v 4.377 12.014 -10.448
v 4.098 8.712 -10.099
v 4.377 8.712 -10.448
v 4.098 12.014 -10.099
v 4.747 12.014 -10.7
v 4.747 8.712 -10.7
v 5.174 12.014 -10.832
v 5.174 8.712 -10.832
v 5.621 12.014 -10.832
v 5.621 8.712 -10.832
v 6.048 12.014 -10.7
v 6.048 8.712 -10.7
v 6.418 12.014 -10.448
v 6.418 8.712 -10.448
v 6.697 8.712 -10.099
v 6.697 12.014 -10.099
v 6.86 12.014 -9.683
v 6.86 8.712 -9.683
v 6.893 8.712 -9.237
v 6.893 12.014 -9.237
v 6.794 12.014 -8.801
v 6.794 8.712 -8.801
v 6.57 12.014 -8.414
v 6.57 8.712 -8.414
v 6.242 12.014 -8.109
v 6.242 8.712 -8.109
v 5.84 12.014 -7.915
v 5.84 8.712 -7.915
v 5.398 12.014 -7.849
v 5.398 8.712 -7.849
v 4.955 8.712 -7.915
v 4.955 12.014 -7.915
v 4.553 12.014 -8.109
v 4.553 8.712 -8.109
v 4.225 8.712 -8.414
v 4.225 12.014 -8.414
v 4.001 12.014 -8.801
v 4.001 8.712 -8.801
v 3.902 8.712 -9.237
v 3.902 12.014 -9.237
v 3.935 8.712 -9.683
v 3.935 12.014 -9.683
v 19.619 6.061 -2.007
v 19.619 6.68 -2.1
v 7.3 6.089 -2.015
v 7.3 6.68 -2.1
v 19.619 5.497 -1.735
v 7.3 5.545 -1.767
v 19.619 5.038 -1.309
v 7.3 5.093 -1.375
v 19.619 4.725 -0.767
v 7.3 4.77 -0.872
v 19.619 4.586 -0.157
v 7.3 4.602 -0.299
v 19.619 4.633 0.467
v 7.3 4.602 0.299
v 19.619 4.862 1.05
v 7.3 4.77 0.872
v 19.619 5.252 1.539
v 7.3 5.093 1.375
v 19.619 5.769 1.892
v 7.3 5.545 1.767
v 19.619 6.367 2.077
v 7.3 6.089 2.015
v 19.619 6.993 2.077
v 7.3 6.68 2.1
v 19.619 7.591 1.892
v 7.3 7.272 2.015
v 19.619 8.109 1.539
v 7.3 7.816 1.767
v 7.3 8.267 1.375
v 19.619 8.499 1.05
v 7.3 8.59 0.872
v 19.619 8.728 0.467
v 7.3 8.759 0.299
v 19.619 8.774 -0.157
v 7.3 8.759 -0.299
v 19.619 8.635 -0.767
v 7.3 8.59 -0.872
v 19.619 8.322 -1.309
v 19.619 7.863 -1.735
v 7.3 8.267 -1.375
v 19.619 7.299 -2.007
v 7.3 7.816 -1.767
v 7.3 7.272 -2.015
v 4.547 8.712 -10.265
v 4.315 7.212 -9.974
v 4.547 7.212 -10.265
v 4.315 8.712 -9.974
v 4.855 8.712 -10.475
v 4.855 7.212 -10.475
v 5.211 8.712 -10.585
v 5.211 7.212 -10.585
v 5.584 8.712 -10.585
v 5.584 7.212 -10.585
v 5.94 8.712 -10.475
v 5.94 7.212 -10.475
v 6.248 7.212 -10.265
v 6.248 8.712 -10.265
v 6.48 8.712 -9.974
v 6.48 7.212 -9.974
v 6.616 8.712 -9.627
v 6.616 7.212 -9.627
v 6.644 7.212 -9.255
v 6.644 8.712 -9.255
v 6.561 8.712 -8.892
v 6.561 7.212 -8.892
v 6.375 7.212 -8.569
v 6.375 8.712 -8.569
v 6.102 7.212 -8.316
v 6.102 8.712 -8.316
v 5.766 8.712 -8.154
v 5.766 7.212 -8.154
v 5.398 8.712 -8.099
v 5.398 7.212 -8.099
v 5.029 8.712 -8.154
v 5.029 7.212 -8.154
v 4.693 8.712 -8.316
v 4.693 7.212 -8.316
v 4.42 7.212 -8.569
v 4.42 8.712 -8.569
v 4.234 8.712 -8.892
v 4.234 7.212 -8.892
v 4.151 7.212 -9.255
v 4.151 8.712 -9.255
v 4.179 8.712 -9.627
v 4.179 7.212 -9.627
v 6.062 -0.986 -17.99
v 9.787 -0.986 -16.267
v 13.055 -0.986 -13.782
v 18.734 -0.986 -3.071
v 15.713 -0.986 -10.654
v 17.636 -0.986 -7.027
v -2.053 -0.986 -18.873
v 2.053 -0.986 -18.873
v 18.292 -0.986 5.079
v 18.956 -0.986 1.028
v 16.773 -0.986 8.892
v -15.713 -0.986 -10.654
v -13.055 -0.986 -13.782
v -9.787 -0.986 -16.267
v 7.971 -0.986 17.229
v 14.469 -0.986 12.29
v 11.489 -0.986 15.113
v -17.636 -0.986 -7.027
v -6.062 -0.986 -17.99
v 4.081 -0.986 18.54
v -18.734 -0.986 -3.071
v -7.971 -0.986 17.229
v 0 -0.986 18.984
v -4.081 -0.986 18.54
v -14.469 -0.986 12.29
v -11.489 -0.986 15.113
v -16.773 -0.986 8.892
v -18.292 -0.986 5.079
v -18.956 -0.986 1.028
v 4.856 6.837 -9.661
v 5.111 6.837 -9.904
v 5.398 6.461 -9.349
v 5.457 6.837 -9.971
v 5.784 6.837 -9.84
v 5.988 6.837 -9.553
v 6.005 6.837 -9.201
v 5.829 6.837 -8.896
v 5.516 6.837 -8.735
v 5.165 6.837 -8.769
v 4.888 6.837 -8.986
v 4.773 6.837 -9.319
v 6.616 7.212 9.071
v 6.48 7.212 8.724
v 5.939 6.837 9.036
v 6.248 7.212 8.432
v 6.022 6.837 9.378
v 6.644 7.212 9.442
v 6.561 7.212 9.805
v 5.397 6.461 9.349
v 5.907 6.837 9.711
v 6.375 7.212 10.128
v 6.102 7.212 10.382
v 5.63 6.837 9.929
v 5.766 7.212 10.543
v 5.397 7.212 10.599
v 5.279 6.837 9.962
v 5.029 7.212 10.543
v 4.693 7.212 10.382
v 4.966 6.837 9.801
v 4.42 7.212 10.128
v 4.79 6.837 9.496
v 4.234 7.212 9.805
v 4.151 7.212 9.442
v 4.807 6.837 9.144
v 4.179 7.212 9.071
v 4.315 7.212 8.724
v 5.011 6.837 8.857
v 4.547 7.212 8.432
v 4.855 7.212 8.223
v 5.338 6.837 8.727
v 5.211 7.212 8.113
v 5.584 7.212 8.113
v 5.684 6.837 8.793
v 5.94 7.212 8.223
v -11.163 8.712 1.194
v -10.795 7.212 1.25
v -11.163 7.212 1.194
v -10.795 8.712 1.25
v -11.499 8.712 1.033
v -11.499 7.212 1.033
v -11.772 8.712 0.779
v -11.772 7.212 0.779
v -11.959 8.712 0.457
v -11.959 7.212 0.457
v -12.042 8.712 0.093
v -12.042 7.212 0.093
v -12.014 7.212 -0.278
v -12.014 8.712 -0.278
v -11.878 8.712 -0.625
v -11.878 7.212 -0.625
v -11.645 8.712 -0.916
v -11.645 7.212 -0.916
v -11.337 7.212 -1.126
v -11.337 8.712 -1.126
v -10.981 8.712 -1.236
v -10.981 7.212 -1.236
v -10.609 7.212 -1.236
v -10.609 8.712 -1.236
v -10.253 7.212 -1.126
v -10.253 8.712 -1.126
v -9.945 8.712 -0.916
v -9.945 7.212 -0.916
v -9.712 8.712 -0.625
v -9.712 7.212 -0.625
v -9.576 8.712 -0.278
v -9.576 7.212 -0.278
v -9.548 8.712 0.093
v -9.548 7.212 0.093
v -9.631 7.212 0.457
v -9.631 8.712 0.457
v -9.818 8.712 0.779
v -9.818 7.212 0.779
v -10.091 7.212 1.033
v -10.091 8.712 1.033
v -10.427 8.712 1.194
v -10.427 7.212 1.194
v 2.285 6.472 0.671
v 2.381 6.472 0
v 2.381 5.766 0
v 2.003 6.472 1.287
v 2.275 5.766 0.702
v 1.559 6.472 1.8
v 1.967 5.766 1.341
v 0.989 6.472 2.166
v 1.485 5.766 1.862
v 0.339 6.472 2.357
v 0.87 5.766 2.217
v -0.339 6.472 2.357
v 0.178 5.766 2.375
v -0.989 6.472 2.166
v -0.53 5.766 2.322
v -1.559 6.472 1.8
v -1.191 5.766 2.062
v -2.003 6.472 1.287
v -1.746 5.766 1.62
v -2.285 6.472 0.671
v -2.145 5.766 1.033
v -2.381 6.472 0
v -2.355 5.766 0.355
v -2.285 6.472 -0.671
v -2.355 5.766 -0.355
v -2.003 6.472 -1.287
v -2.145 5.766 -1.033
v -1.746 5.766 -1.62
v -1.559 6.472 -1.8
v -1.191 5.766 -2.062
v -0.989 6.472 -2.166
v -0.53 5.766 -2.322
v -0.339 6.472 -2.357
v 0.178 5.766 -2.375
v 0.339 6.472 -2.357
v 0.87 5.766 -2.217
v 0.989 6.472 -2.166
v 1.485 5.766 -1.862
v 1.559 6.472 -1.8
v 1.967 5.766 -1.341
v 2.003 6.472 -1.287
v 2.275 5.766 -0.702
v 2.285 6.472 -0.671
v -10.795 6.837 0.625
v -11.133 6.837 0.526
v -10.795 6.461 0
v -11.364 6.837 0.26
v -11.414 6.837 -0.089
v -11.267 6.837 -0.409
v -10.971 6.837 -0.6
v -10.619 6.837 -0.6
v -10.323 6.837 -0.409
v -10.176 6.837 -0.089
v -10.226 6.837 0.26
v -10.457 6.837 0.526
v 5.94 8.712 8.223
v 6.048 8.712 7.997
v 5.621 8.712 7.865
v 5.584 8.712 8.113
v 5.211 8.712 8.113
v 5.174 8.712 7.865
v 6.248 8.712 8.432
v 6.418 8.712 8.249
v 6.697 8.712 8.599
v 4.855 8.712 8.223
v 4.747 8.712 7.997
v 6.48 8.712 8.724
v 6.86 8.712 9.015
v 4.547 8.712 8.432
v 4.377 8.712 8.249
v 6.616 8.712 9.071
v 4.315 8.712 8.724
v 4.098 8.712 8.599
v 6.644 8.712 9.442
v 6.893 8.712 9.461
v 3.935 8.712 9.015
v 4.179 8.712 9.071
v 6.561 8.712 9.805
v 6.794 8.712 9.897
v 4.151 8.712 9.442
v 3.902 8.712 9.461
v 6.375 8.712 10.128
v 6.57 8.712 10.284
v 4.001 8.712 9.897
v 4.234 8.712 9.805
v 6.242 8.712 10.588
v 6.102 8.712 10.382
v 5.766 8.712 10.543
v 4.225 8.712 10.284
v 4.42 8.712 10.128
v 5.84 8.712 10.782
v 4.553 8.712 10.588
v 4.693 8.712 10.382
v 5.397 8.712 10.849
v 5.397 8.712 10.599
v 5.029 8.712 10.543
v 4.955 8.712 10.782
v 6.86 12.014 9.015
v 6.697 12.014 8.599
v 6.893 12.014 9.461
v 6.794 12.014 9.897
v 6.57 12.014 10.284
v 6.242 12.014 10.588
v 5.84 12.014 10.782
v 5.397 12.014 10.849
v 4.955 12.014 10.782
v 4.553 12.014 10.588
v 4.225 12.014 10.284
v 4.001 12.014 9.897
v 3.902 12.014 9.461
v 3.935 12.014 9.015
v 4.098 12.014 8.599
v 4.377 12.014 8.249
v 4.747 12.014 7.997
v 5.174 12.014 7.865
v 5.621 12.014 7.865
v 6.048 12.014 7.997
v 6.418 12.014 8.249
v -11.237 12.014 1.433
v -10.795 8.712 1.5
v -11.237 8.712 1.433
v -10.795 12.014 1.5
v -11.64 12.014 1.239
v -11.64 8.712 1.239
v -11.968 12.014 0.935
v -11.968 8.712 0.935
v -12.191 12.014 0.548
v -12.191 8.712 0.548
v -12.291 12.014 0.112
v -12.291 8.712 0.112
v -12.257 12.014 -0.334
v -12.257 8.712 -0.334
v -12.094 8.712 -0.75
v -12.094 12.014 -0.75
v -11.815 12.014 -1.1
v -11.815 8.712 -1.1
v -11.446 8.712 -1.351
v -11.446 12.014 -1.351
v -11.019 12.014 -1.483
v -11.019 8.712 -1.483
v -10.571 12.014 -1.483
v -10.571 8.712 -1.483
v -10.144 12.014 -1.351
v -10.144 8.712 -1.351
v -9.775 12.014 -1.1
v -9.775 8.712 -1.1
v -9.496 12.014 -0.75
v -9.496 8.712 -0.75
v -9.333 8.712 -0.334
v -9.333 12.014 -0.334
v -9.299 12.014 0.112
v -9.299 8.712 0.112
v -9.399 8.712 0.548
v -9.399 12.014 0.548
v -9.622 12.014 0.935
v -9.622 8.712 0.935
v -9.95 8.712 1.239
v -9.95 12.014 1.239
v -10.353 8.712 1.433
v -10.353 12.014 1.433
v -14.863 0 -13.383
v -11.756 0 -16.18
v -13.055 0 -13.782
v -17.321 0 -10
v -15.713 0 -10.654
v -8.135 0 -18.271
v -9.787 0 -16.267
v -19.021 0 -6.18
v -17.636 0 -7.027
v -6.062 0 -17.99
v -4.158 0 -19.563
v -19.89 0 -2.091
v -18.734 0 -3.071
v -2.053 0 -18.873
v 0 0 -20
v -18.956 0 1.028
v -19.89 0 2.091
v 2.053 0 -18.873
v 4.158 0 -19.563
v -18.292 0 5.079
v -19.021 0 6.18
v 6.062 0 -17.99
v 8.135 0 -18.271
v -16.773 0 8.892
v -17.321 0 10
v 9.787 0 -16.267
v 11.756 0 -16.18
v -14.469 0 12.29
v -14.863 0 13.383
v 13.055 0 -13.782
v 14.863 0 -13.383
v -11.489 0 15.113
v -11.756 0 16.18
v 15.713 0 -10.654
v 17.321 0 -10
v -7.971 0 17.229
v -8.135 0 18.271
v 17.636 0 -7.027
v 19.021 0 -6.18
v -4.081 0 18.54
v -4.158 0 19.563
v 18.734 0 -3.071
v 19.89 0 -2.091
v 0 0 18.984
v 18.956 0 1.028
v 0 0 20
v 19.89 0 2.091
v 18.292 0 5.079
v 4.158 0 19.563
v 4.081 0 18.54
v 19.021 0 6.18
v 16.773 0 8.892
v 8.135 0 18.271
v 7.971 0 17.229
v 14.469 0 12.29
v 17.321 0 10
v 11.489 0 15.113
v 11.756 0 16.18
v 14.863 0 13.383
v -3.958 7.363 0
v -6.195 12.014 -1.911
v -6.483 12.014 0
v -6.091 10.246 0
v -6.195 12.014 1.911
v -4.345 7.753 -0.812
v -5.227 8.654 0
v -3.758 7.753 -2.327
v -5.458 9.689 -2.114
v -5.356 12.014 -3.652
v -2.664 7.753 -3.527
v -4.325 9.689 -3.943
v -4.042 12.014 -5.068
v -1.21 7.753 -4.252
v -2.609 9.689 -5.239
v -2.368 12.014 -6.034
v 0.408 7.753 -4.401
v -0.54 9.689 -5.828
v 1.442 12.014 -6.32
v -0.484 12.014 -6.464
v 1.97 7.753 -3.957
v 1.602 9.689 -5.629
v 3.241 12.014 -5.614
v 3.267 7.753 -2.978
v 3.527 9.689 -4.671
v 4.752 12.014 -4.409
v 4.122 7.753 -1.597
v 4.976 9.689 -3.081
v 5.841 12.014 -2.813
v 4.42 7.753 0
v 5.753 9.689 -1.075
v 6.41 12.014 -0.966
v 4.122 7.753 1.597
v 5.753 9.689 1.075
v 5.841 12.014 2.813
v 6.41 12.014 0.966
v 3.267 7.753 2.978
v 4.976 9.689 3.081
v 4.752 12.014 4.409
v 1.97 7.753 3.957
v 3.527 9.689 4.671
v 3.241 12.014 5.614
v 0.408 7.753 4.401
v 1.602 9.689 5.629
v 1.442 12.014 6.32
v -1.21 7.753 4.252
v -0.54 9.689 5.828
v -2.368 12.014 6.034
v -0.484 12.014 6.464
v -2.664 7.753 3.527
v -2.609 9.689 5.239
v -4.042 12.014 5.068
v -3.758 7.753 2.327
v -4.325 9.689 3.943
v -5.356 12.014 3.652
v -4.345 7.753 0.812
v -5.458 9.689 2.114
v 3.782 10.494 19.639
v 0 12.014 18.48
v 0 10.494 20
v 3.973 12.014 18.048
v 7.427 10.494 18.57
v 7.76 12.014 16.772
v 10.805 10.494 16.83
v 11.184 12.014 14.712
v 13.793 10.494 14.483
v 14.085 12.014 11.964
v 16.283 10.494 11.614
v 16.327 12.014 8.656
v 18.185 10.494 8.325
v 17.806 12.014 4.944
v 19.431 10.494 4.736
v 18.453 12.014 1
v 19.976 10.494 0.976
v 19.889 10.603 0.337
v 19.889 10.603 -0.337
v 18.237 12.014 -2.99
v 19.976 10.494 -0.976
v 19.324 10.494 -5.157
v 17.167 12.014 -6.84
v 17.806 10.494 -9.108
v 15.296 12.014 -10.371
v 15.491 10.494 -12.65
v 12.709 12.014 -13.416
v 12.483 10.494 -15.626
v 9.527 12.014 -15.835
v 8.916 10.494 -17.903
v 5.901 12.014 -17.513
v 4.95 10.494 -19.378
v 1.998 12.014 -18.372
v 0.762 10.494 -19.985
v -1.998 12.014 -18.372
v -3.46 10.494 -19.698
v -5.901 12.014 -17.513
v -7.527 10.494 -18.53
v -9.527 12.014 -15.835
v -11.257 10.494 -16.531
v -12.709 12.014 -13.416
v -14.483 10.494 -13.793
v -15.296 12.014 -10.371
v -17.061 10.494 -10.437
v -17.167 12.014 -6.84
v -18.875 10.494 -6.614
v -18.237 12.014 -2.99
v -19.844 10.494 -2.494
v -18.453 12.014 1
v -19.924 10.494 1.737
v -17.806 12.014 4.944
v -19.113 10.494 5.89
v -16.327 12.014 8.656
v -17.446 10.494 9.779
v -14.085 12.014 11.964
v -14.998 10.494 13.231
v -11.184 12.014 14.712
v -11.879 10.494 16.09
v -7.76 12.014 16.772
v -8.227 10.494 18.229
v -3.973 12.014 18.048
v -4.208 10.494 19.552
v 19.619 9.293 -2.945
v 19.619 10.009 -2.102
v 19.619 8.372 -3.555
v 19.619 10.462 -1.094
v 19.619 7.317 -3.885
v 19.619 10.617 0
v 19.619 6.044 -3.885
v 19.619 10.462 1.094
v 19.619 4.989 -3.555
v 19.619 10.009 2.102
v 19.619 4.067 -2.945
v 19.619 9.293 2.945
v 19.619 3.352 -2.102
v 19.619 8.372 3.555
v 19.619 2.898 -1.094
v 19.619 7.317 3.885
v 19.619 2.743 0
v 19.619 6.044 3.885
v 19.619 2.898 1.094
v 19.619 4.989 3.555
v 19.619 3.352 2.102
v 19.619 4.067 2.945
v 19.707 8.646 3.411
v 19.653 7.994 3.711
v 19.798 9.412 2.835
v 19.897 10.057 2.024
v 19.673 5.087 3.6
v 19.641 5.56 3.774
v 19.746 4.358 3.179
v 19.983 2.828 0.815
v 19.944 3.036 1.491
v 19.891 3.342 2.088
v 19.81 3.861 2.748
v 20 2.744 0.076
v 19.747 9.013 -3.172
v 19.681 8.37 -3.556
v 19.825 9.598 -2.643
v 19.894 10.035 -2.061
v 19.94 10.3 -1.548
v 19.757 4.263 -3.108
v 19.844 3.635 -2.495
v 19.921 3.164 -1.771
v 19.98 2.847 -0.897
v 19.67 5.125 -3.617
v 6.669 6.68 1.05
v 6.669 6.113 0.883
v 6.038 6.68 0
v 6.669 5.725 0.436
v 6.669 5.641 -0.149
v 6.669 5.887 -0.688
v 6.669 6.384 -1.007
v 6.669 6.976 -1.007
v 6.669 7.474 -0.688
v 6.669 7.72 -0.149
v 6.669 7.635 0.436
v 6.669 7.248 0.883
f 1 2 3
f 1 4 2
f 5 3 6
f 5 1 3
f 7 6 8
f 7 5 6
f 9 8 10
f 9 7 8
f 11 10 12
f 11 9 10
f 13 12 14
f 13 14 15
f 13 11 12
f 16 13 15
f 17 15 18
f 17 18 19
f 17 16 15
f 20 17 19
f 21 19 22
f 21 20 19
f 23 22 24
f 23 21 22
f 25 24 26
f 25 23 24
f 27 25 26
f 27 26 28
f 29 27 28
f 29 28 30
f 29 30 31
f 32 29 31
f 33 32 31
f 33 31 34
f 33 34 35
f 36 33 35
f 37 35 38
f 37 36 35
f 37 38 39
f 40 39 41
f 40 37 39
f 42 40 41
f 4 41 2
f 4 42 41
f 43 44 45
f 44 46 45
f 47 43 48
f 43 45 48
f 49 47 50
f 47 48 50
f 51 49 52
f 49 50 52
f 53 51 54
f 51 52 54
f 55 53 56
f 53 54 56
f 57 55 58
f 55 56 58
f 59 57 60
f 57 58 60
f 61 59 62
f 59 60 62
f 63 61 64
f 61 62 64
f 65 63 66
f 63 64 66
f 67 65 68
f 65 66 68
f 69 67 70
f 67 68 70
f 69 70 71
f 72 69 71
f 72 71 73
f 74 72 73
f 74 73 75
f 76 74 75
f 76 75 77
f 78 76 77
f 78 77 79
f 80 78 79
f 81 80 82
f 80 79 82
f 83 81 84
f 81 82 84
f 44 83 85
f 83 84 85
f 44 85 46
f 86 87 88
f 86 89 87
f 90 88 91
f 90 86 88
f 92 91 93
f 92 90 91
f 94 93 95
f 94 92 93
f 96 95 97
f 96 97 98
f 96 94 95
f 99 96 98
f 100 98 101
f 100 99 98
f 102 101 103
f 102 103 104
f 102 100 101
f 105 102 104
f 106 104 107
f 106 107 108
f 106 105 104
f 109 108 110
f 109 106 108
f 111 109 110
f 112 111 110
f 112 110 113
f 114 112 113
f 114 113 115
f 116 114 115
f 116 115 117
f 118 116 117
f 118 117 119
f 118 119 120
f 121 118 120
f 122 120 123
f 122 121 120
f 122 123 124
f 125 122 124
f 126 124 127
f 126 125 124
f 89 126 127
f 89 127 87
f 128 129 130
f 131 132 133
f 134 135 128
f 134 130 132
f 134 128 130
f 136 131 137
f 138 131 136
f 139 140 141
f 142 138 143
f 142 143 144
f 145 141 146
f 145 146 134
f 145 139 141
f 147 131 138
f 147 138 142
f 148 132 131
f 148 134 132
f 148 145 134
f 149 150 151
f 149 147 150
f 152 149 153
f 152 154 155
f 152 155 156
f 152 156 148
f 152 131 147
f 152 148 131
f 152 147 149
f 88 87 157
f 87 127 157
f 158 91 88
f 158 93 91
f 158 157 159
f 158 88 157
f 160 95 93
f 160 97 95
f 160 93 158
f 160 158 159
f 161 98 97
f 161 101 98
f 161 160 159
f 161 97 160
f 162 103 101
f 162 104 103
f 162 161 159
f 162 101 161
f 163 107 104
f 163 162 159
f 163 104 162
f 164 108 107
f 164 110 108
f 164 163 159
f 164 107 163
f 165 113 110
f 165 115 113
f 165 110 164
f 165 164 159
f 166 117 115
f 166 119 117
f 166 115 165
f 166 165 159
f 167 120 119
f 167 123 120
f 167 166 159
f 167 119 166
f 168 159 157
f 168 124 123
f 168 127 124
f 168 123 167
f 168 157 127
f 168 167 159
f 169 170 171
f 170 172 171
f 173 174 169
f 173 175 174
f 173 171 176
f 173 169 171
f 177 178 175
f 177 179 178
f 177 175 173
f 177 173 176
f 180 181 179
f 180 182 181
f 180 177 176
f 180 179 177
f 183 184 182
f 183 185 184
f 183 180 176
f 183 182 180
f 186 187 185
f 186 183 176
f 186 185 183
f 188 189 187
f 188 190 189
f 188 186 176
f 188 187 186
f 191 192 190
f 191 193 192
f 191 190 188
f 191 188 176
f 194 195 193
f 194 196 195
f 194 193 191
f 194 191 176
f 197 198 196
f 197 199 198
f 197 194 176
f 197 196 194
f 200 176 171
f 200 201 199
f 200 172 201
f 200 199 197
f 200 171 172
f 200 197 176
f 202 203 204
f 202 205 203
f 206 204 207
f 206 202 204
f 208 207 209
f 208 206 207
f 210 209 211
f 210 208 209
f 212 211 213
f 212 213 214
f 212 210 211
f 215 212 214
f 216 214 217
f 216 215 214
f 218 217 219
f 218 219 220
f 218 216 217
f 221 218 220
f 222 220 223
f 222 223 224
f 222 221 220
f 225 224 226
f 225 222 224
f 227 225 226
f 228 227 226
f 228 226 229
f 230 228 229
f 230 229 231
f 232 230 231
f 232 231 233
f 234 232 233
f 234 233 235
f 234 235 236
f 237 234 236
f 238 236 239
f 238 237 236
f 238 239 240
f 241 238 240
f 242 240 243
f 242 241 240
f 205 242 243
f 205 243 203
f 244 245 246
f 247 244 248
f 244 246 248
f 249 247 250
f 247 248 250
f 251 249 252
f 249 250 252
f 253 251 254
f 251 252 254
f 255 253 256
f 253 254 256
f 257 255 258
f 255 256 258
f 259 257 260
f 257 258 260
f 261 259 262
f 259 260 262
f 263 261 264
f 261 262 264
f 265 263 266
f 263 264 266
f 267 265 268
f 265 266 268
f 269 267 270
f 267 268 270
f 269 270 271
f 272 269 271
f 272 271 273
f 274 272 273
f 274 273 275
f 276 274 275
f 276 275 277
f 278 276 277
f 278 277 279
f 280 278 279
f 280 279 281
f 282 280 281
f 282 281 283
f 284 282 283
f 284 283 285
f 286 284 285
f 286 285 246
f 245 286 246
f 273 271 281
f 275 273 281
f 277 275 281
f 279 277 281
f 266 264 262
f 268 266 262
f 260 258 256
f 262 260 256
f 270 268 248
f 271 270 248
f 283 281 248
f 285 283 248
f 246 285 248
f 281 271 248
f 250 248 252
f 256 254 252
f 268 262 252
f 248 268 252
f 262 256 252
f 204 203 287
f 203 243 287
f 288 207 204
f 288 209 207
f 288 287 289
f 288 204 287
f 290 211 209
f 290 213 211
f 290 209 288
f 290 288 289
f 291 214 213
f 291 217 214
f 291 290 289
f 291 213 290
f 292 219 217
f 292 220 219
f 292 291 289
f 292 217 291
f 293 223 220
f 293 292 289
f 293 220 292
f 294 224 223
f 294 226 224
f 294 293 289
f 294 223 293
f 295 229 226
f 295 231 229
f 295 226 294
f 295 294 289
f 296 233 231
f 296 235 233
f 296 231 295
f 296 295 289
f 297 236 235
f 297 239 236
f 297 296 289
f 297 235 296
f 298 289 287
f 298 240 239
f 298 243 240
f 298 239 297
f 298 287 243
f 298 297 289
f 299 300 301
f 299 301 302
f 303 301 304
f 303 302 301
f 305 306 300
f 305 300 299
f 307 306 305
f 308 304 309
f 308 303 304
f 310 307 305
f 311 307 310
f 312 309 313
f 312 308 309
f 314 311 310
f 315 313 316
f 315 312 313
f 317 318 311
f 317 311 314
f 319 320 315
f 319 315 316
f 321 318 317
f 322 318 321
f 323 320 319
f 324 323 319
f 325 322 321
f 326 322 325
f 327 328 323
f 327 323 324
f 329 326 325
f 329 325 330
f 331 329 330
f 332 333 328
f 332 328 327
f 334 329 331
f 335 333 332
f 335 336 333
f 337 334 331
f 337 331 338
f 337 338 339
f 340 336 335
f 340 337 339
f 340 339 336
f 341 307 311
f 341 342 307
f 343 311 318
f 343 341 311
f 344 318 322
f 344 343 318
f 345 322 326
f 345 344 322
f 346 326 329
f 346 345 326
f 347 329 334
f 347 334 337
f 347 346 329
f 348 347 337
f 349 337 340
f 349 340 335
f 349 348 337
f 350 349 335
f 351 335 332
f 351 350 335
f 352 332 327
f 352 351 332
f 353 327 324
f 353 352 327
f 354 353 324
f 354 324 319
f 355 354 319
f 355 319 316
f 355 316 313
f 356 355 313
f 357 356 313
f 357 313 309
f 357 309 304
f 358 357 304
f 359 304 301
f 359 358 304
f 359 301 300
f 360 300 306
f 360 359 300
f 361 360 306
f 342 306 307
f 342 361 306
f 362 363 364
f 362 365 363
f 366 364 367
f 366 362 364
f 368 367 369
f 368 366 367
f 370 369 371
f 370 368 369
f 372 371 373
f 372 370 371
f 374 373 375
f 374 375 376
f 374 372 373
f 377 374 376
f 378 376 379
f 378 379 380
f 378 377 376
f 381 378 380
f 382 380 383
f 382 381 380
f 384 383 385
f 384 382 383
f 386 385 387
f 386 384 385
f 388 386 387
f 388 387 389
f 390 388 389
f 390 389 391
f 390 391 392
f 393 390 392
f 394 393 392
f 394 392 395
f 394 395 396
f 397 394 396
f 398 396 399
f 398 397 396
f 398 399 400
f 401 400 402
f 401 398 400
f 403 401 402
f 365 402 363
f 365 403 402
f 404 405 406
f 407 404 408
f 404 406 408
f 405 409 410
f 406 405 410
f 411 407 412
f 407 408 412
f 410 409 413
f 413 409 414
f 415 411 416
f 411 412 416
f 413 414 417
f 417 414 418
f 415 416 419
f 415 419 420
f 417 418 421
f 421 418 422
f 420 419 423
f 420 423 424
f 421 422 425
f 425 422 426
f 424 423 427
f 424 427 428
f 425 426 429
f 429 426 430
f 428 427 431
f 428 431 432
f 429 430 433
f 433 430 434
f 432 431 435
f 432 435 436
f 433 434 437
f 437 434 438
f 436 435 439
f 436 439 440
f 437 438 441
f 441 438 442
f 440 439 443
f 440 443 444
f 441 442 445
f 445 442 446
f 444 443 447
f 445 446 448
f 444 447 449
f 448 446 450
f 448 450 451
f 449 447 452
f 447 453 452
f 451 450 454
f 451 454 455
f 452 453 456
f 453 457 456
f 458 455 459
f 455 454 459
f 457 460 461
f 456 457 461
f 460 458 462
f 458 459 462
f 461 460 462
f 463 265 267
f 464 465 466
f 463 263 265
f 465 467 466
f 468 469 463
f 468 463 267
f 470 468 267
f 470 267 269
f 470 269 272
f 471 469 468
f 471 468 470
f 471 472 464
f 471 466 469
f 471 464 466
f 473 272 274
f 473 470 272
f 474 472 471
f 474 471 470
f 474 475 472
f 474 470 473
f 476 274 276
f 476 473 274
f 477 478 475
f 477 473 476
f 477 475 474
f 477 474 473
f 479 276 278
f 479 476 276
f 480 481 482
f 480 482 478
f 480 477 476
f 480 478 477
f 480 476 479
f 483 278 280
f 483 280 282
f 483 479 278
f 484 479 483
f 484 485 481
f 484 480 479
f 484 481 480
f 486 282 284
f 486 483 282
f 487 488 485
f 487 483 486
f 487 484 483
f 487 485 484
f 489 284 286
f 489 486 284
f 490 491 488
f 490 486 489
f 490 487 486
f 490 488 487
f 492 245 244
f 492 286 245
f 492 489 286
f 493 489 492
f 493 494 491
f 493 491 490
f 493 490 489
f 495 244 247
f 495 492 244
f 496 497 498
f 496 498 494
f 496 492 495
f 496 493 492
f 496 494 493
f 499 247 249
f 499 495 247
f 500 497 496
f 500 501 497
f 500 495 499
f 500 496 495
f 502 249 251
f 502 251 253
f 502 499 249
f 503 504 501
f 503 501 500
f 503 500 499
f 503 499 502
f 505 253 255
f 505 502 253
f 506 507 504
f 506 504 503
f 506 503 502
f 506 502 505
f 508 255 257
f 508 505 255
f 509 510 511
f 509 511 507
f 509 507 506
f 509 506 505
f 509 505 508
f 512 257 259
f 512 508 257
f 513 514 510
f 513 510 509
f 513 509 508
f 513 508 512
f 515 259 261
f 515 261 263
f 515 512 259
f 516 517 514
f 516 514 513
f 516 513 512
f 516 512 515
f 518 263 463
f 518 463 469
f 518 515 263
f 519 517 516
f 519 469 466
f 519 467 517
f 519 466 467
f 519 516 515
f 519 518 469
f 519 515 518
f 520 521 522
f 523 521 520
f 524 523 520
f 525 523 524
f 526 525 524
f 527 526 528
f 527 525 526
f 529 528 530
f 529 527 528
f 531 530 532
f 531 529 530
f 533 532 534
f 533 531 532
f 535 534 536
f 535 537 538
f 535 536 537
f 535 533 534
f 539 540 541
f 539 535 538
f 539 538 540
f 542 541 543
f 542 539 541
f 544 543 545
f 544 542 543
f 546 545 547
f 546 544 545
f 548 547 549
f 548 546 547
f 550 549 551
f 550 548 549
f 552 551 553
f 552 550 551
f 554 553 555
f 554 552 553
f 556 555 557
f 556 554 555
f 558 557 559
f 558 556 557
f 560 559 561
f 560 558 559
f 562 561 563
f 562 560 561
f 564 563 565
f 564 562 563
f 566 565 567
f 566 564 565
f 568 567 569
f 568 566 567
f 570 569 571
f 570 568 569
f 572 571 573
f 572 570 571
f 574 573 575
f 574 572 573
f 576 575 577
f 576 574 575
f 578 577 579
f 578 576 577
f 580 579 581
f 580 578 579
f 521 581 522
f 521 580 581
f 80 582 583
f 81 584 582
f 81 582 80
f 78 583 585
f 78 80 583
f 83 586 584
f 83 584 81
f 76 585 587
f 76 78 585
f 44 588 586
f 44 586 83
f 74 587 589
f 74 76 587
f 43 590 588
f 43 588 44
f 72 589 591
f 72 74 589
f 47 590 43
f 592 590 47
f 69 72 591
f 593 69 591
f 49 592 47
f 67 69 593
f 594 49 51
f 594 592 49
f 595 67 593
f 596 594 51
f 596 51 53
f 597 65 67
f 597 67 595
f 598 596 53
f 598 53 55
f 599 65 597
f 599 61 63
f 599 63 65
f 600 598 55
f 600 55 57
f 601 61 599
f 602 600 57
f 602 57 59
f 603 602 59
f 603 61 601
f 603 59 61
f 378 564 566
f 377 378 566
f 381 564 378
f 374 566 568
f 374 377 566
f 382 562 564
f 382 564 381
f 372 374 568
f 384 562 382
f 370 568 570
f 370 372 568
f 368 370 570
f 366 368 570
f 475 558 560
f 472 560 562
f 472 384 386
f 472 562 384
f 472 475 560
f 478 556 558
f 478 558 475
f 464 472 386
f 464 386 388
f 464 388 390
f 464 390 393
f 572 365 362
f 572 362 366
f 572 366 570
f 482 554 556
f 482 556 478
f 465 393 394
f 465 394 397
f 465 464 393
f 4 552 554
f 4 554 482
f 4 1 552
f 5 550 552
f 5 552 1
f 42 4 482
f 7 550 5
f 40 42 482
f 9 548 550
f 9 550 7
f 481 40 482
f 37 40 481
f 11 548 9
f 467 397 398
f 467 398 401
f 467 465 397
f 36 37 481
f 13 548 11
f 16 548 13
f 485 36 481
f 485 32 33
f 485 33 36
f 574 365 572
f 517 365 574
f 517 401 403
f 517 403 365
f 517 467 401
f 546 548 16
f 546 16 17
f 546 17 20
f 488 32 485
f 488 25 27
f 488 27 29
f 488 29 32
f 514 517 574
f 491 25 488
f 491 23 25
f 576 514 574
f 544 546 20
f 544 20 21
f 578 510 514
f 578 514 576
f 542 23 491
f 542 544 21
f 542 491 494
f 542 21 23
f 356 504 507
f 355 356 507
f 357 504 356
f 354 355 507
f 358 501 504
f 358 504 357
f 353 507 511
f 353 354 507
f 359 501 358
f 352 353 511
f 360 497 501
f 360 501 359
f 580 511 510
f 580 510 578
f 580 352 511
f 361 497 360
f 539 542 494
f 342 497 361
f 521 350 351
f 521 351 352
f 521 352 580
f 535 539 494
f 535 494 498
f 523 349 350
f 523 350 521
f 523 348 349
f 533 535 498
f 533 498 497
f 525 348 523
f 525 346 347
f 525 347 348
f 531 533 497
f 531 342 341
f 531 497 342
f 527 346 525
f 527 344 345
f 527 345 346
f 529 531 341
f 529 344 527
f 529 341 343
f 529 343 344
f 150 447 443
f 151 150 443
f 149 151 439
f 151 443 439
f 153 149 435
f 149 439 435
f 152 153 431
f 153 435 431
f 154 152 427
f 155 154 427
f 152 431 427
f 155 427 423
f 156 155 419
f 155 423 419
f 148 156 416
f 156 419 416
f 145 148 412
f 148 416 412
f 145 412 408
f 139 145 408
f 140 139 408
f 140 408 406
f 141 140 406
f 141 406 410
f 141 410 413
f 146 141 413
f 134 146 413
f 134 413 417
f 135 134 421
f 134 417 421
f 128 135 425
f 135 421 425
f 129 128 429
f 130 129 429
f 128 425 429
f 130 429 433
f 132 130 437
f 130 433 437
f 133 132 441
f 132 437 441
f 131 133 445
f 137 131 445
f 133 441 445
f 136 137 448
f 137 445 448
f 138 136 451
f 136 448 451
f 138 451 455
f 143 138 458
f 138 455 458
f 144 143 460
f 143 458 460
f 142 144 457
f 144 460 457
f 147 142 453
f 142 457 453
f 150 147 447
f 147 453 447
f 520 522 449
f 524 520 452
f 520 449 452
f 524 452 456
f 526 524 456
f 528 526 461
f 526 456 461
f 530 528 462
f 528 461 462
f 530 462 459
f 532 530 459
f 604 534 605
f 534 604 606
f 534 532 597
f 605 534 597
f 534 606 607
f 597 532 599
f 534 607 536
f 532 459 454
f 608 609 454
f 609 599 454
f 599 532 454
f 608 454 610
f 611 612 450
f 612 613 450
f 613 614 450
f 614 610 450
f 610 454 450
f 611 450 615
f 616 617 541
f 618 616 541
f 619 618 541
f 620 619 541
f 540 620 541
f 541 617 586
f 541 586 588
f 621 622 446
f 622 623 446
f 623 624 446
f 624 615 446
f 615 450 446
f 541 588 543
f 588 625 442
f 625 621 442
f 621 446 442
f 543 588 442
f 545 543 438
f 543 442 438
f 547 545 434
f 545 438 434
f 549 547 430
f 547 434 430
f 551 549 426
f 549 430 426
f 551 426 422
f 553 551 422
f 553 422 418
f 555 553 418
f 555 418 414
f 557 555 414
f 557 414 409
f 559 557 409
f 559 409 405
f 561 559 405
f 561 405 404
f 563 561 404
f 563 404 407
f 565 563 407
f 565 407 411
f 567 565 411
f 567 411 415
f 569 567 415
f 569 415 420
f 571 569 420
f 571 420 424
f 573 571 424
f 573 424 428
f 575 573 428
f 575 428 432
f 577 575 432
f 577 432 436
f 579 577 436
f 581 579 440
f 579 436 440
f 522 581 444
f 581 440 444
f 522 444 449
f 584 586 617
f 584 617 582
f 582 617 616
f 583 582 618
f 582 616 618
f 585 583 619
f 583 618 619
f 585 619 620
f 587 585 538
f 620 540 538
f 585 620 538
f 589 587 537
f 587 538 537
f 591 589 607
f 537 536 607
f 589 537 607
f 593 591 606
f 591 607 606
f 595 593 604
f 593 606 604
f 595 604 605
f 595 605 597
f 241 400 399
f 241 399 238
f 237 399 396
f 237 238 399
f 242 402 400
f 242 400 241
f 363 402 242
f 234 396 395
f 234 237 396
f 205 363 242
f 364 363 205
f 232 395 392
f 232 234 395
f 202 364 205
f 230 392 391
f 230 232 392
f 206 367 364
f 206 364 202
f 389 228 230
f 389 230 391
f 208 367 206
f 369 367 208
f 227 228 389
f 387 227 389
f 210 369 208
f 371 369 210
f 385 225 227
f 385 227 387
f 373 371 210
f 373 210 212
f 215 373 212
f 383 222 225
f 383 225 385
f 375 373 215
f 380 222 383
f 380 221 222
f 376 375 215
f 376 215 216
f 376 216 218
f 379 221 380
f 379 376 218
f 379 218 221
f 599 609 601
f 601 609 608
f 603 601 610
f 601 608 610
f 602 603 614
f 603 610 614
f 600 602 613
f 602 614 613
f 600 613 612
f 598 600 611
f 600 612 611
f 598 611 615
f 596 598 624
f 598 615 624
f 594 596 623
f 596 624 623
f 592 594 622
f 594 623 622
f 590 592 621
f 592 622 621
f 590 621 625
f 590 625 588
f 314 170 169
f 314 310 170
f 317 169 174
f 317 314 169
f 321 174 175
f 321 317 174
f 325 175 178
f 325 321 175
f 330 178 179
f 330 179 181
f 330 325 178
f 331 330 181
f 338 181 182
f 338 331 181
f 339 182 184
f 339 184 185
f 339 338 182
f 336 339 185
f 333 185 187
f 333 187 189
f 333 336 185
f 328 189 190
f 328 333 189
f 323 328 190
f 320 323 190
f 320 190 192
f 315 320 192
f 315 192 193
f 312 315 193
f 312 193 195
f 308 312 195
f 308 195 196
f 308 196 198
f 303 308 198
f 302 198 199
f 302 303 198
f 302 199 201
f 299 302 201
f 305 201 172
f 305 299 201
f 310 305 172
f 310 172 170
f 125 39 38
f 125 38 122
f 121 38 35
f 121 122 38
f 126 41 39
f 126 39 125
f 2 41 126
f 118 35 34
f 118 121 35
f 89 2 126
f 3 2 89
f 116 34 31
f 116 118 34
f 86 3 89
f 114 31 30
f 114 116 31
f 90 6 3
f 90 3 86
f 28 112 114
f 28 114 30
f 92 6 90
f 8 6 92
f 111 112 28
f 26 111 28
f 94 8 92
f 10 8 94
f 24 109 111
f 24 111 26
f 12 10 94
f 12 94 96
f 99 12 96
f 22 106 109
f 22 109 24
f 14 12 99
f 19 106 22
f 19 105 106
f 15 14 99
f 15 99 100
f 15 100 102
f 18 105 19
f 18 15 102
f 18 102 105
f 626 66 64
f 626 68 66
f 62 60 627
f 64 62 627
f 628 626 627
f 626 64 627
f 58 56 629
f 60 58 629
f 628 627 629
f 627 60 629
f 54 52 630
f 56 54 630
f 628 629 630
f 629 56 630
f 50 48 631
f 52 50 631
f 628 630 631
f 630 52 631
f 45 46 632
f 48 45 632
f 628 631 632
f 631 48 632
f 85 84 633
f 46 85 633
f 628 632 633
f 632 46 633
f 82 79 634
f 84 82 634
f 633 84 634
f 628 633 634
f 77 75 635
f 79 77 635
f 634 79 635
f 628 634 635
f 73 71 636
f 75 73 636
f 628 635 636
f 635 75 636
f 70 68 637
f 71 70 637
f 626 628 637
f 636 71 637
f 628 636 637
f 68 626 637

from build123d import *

# Parameters (mm, degrees)
SKETCH1_R                          = 20
EXTRUDE1_DEPTH                     = 12.0142
CHAMFER1_SIZE                      = 1.52
F_3_16_0_1875_DIAMETER_HOLE1_D     = 4.7625
F_3_16_0_1875_DIAMETER_HOLE1_DEPTH = 6.2484
SKETCH5_R                          = 18.984
EXTRUDE2_DEPTH                     = 0.98552
M5X0_8_TAPPED_HOLE1_D              = 4.2
M5X0_8_TAPPED_HOLE1_DEPTH          = 12.7
M5X0_8_TAPPED_HOLE1_TIP            = 1.2618073
CIRPATTERN1_COUNT                  = 3
SKETCH10_R                         = 3.937
CUT_EXTRUDE3_DEPTH                 = 0.381


with BuildPart() as part:
    # Sketch1 → Extrude1 (new body)
    with BuildSketch(Plane(origin=(0, 0, 0), x_dir=(1, 0, 0), z_dir=(0, 1, 0))):
        with Locations(Location((0, 0, 0), (0, 0, 270))):  # turned: the seam where the file's is
            Circle(SKETCH1_R)
    extrude(amount=EXTRUDE1_DEPTH)

    # Chamfer1
    chamfer1_edges = [part.edges().sort_by_distance(p)[0] for p in [
        (0, 12.0142, -20),
    ]]
    chamfer(chamfer1_edges, length=CHAMFER1_SIZE)

    # Sketch2 → Cut-Revolve1 (revolve, cut)
    with BuildSketch(Plane.XY):
        with BuildLine():
            Line((0, 19.0246), (0, 6.0198))
            ThreePointArc((0, 6.0198), (-6.5024, 12.5222), (0, 19.0246))
        make_face()
    revolve(axis=Axis((0, 19.0246, 0), (0, -1, 0)), mode=Mode.SUBTRACT)

    # 3_16 _0.1875_ Diameter Hole1
    with Locations(Plane(origin=(0, 12.0142, 0), x_dir=(-1, 0, 0), z_dir=(0, 1, 0))):
        with Locations((0, 0)):
            Hole(F_3_16_0_1875_DIAMETER_HOLE1_D / 2, depth=F_3_16_0_1875_DIAMETER_HOLE1_DEPTH)

    # Sketch5 → Extrude2 (add)
    with BuildSketch(Plane.XZ):
        with Locations(Location((0, 0, 0), (0, 0, 90))):  # turned: the seam where the file's is
            Circle(SKETCH5_R)
    extrude(amount=EXTRUDE2_DEPTH)

    # M5x0.8 Tapped Hole1
    with Locations(Plane(origin=(20, 6.6802, 0), x_dir=(0, 0, 1), z_dir=(1, 0, 0))):
        with Locations((0, 0)):
            Hole(M5X0_8_TAPPED_HOLE1_D / 2, depth=M5X0_8_TAPPED_HOLE1_DEPTH)
            with Locations((0, 0, -(M5X0_8_TAPPED_HOLE1_DEPTH + M5X0_8_TAPPED_HOLE1_TIP / 2))):  # 118° drill point
                Cone(0, M5X0_8_TAPPED_HOLE1_D / 2, M5X0_8_TAPPED_HOLE1_TIP, mode=Mode.SUBTRACT)

    # Sketch8 → M3x0.5 Tapped Hole1 (revolve, cut)
    with BuildSketch(Plane(origin=(-10.795, 12.0142, 0), x_dir=(0, 0, 1), z_dir=(1, 0, 0))):
        Polygon((0, 0), (0, 5.553072774), (1.25, 4.801997), (1.25, 3.302), (1.5, 3.302), (1.5, 0), align=None)
    m3x0_5_tapped_hole1 = revolve(axis=Axis((-10.795, 18.3642, 0), (0, -1, 0)), mode=Mode.SUBTRACT)

    # CirPattern1: M3x0.5 Tapped Hole1 ×3 about axis
    cirpattern1_axis = Axis((0, 0, 0), (0, 1, 0))
    for i in range(1, CIRPATTERN1_COUNT):
        add(m3x0_5_tapped_hole1.rotate(cirpattern1_axis, i * 360 / CIRPATTERN1_COUNT), mode=Mode.SUBTRACT)

    # Sketch10 → Cut-Extrude3 (cut)
    with BuildSketch(Plane(origin=(20, 5.2471, 0), x_dir=(0, 0, 1), z_dir=(1, 0, 0))):
        with Locations((0, -1.4331)):
            Circle(SKETCH10_R)
    extrude(amount=-CUT_EXTRUDE3_DEPTH, mode=Mode.SUBTRACT)


solid = part.part
